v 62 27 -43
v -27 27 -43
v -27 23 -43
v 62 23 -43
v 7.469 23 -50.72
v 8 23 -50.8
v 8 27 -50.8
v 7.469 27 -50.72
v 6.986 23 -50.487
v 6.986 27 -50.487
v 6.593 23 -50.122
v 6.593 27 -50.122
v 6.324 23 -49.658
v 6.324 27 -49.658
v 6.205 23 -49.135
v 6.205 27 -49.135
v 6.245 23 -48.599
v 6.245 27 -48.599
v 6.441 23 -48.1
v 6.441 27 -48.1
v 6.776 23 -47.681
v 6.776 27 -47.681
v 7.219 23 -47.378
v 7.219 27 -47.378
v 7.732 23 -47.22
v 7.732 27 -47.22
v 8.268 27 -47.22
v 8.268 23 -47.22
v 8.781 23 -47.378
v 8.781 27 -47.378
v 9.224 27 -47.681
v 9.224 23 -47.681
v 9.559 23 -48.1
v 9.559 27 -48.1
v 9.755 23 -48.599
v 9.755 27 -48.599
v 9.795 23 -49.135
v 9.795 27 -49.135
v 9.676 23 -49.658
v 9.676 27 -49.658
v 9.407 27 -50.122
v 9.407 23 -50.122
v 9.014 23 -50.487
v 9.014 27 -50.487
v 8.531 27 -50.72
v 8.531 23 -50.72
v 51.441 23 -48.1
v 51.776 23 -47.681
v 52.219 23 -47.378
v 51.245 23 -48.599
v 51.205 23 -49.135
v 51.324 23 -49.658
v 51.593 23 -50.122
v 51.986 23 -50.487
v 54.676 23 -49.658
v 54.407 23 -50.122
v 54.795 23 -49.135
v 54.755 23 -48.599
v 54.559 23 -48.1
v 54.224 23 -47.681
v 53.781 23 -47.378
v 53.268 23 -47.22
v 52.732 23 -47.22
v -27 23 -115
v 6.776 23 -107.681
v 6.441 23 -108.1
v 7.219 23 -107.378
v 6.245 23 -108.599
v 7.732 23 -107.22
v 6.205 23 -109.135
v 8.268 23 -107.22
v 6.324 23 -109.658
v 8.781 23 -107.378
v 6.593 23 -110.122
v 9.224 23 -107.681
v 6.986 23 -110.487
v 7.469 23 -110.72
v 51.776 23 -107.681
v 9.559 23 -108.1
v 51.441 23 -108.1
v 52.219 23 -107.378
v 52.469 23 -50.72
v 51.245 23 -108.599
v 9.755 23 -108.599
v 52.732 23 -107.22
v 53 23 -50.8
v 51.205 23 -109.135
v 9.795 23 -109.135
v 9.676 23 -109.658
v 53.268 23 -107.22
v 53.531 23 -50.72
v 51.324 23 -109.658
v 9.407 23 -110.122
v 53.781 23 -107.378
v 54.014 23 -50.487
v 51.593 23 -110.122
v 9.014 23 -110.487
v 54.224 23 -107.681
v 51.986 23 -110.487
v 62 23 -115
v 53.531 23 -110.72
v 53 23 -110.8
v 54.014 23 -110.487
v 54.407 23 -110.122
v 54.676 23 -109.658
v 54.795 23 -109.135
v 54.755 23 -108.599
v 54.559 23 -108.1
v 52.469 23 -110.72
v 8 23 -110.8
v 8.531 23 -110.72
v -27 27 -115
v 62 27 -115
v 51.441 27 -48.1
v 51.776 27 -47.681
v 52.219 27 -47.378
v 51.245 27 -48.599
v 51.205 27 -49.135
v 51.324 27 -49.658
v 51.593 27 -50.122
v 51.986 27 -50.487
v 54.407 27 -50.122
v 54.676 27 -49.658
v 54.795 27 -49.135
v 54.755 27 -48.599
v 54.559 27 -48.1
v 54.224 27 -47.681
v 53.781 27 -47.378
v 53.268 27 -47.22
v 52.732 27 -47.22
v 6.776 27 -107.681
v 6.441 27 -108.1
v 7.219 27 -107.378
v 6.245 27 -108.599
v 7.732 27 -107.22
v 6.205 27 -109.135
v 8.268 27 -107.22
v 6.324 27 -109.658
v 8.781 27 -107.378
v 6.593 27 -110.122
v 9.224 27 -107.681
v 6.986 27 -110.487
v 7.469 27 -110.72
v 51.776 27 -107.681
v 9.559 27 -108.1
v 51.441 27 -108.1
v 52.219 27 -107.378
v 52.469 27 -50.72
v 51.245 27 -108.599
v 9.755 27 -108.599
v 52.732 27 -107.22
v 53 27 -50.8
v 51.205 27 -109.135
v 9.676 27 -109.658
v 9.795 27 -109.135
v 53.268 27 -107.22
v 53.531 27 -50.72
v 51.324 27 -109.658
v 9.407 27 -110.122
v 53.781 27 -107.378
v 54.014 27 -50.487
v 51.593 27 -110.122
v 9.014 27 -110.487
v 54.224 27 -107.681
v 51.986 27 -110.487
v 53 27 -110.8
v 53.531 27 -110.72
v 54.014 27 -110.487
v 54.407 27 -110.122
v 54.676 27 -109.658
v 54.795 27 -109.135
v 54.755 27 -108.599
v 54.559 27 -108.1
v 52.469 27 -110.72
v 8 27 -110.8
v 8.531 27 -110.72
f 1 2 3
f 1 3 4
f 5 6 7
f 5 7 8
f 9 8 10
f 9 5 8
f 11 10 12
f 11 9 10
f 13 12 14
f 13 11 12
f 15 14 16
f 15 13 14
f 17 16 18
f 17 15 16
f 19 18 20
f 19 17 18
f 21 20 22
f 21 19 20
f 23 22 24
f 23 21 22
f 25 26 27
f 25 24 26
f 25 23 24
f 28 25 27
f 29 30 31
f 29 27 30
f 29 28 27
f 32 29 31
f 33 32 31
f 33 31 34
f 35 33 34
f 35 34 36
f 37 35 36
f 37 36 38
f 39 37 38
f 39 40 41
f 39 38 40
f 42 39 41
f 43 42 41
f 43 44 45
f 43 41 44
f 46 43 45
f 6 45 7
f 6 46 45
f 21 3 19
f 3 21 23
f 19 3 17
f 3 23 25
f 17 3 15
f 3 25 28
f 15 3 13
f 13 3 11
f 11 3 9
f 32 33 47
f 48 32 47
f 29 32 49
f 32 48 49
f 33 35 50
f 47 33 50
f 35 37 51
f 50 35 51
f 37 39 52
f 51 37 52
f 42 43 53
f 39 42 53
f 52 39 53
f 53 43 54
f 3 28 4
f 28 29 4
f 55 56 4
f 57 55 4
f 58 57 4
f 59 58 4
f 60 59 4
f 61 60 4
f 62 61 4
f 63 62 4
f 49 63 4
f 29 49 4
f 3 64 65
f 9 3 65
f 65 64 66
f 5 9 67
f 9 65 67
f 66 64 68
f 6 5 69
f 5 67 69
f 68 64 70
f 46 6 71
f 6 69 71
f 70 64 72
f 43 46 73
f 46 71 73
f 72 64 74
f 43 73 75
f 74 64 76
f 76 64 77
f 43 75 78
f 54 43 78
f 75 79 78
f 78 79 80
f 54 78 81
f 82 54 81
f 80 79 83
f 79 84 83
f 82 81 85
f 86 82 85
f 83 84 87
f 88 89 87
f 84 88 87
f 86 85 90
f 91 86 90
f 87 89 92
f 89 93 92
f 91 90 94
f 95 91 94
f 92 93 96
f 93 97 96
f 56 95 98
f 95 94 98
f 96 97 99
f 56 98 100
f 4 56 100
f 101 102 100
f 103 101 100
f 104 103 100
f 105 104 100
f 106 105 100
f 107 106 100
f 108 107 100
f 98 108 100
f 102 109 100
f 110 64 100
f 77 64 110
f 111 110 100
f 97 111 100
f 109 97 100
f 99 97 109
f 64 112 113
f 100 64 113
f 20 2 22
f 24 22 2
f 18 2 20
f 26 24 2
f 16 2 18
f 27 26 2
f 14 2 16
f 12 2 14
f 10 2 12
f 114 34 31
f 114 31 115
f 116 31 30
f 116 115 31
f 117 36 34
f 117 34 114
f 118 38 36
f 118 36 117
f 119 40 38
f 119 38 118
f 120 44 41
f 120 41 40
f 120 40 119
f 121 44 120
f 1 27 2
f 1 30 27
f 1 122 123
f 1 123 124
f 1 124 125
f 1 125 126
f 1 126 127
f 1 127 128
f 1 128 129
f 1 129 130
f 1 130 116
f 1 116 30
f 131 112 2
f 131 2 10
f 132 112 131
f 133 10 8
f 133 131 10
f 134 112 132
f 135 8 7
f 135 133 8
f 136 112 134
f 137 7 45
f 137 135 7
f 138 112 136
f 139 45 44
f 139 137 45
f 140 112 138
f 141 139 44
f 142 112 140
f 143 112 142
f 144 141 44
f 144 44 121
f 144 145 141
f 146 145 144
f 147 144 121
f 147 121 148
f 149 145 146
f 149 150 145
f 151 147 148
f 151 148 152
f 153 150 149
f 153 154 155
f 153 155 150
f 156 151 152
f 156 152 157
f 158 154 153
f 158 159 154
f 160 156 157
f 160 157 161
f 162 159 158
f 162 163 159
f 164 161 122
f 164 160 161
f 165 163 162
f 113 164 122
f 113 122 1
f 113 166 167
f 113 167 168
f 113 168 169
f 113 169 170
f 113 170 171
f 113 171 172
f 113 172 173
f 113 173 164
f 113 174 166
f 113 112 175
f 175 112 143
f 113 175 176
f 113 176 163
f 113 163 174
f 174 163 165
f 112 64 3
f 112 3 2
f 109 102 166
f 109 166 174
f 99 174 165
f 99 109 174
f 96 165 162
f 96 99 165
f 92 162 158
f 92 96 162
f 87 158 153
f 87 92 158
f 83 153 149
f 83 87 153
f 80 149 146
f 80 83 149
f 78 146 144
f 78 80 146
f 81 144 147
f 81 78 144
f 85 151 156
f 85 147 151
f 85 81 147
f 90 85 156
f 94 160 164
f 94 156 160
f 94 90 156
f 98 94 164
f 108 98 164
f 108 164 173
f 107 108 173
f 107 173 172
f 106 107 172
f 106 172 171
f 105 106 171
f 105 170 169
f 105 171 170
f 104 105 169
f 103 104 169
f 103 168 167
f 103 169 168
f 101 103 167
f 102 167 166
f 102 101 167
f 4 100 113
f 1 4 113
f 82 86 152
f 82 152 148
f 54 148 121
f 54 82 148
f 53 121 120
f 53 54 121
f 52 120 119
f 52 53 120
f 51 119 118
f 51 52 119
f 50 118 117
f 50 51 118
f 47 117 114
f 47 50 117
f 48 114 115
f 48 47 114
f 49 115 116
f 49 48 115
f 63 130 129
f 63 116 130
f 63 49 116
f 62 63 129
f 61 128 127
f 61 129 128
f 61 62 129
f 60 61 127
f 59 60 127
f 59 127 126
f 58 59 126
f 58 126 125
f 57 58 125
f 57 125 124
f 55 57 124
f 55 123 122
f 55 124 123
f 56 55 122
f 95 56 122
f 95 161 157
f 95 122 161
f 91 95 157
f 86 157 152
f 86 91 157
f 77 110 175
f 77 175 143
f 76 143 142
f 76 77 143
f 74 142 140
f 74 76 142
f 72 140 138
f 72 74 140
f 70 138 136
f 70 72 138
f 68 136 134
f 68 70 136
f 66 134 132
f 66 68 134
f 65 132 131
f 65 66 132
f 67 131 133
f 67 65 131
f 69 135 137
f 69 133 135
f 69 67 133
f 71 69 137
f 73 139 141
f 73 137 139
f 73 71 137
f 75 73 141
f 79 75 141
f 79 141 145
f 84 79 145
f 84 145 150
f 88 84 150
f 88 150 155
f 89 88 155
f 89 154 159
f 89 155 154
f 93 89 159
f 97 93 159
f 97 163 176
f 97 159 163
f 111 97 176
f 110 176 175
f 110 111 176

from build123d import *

# Parameters (mm, degrees)
CYLINDER019_R               = 1.8
CYLINDER019_DEPTH           = 20
ARRAY001010_X_COUNT         = 2
ARRAY001010_X_PITCH         = 60
ARRAY001010_Z_COUNT         = 3
ARRAY001010_Z_PITCH         = 45
ARRAY001010_PLACEMENT_ANGLE = 90
BOX011_W                    = 89
BOX011_H                    = 4
BOX011_DEPTH                = 72


with BuildPart() as bottom_hole_array004:
    # Cylinder019 → Cylinder019 (new body)
    with BuildSketch(Plane(origin=(59, 14, 53), x_dir=(1, 0, 0), z_dir=(0, 1, 0))):
        Circle(CYLINDER019_R)
    extrude(amount=CYLINDER019_DEPTH)

    # Array001010 X: bottom hole array004 ×2


with BuildPart() as bottom_hole_array004_1:
    add(bottom_hole_array004.part)
    with Locations(*[(i * ARRAY001010_X_PITCH, 0, 0) for i in range(1, ARRAY001010_X_COUNT)]):
        add(bottom_hole_array004.part)

    # Array001010 Z: bottom hole array004 ×3


with BuildPart() as bottom_hole_array004_2:
    add(bottom_hole_array004_1.part)
    with Locations(*[(0, 0, -i * ARRAY001010_Z_PITCH) for i in range(1, ARRAY001010_Z_COUNT)]):
        add(bottom_hole_array004_1.part)


with BuildPart() as bottom_hole_array004_3:
    # Array001010 placement: moved
    add(bottom_hole_array004_2.part.rotate(Axis((0, 0, 0), (0, 1, 0)), ARRAY001010_PLACEMENT_ANGLE))


with BuildPart() as top_plate_cut002:
    # Box011 → Box011 (new body)
    with BuildSketch(Plane(origin=(-27, 23, -125), x_dir=(1, 0, 0), z_dir=(0, 0, 1))):
        with Locations((44.5, 2)):
            Rectangle(BOX011_W, BOX011_H)
    extrude(amount=BOX011_DEPTH)

    # Cut010: cut bottom hole array004
    add(bottom_hole_array004_3.part, mode=Mode.SUBTRACT)


with BuildPart() as top_plate_cut002_1:
    # Cut010 placement: moved
    add(top_plate_cut002.part.moved(Location((0, 0, 10))))


solid = top_plate_cut002_1.part
